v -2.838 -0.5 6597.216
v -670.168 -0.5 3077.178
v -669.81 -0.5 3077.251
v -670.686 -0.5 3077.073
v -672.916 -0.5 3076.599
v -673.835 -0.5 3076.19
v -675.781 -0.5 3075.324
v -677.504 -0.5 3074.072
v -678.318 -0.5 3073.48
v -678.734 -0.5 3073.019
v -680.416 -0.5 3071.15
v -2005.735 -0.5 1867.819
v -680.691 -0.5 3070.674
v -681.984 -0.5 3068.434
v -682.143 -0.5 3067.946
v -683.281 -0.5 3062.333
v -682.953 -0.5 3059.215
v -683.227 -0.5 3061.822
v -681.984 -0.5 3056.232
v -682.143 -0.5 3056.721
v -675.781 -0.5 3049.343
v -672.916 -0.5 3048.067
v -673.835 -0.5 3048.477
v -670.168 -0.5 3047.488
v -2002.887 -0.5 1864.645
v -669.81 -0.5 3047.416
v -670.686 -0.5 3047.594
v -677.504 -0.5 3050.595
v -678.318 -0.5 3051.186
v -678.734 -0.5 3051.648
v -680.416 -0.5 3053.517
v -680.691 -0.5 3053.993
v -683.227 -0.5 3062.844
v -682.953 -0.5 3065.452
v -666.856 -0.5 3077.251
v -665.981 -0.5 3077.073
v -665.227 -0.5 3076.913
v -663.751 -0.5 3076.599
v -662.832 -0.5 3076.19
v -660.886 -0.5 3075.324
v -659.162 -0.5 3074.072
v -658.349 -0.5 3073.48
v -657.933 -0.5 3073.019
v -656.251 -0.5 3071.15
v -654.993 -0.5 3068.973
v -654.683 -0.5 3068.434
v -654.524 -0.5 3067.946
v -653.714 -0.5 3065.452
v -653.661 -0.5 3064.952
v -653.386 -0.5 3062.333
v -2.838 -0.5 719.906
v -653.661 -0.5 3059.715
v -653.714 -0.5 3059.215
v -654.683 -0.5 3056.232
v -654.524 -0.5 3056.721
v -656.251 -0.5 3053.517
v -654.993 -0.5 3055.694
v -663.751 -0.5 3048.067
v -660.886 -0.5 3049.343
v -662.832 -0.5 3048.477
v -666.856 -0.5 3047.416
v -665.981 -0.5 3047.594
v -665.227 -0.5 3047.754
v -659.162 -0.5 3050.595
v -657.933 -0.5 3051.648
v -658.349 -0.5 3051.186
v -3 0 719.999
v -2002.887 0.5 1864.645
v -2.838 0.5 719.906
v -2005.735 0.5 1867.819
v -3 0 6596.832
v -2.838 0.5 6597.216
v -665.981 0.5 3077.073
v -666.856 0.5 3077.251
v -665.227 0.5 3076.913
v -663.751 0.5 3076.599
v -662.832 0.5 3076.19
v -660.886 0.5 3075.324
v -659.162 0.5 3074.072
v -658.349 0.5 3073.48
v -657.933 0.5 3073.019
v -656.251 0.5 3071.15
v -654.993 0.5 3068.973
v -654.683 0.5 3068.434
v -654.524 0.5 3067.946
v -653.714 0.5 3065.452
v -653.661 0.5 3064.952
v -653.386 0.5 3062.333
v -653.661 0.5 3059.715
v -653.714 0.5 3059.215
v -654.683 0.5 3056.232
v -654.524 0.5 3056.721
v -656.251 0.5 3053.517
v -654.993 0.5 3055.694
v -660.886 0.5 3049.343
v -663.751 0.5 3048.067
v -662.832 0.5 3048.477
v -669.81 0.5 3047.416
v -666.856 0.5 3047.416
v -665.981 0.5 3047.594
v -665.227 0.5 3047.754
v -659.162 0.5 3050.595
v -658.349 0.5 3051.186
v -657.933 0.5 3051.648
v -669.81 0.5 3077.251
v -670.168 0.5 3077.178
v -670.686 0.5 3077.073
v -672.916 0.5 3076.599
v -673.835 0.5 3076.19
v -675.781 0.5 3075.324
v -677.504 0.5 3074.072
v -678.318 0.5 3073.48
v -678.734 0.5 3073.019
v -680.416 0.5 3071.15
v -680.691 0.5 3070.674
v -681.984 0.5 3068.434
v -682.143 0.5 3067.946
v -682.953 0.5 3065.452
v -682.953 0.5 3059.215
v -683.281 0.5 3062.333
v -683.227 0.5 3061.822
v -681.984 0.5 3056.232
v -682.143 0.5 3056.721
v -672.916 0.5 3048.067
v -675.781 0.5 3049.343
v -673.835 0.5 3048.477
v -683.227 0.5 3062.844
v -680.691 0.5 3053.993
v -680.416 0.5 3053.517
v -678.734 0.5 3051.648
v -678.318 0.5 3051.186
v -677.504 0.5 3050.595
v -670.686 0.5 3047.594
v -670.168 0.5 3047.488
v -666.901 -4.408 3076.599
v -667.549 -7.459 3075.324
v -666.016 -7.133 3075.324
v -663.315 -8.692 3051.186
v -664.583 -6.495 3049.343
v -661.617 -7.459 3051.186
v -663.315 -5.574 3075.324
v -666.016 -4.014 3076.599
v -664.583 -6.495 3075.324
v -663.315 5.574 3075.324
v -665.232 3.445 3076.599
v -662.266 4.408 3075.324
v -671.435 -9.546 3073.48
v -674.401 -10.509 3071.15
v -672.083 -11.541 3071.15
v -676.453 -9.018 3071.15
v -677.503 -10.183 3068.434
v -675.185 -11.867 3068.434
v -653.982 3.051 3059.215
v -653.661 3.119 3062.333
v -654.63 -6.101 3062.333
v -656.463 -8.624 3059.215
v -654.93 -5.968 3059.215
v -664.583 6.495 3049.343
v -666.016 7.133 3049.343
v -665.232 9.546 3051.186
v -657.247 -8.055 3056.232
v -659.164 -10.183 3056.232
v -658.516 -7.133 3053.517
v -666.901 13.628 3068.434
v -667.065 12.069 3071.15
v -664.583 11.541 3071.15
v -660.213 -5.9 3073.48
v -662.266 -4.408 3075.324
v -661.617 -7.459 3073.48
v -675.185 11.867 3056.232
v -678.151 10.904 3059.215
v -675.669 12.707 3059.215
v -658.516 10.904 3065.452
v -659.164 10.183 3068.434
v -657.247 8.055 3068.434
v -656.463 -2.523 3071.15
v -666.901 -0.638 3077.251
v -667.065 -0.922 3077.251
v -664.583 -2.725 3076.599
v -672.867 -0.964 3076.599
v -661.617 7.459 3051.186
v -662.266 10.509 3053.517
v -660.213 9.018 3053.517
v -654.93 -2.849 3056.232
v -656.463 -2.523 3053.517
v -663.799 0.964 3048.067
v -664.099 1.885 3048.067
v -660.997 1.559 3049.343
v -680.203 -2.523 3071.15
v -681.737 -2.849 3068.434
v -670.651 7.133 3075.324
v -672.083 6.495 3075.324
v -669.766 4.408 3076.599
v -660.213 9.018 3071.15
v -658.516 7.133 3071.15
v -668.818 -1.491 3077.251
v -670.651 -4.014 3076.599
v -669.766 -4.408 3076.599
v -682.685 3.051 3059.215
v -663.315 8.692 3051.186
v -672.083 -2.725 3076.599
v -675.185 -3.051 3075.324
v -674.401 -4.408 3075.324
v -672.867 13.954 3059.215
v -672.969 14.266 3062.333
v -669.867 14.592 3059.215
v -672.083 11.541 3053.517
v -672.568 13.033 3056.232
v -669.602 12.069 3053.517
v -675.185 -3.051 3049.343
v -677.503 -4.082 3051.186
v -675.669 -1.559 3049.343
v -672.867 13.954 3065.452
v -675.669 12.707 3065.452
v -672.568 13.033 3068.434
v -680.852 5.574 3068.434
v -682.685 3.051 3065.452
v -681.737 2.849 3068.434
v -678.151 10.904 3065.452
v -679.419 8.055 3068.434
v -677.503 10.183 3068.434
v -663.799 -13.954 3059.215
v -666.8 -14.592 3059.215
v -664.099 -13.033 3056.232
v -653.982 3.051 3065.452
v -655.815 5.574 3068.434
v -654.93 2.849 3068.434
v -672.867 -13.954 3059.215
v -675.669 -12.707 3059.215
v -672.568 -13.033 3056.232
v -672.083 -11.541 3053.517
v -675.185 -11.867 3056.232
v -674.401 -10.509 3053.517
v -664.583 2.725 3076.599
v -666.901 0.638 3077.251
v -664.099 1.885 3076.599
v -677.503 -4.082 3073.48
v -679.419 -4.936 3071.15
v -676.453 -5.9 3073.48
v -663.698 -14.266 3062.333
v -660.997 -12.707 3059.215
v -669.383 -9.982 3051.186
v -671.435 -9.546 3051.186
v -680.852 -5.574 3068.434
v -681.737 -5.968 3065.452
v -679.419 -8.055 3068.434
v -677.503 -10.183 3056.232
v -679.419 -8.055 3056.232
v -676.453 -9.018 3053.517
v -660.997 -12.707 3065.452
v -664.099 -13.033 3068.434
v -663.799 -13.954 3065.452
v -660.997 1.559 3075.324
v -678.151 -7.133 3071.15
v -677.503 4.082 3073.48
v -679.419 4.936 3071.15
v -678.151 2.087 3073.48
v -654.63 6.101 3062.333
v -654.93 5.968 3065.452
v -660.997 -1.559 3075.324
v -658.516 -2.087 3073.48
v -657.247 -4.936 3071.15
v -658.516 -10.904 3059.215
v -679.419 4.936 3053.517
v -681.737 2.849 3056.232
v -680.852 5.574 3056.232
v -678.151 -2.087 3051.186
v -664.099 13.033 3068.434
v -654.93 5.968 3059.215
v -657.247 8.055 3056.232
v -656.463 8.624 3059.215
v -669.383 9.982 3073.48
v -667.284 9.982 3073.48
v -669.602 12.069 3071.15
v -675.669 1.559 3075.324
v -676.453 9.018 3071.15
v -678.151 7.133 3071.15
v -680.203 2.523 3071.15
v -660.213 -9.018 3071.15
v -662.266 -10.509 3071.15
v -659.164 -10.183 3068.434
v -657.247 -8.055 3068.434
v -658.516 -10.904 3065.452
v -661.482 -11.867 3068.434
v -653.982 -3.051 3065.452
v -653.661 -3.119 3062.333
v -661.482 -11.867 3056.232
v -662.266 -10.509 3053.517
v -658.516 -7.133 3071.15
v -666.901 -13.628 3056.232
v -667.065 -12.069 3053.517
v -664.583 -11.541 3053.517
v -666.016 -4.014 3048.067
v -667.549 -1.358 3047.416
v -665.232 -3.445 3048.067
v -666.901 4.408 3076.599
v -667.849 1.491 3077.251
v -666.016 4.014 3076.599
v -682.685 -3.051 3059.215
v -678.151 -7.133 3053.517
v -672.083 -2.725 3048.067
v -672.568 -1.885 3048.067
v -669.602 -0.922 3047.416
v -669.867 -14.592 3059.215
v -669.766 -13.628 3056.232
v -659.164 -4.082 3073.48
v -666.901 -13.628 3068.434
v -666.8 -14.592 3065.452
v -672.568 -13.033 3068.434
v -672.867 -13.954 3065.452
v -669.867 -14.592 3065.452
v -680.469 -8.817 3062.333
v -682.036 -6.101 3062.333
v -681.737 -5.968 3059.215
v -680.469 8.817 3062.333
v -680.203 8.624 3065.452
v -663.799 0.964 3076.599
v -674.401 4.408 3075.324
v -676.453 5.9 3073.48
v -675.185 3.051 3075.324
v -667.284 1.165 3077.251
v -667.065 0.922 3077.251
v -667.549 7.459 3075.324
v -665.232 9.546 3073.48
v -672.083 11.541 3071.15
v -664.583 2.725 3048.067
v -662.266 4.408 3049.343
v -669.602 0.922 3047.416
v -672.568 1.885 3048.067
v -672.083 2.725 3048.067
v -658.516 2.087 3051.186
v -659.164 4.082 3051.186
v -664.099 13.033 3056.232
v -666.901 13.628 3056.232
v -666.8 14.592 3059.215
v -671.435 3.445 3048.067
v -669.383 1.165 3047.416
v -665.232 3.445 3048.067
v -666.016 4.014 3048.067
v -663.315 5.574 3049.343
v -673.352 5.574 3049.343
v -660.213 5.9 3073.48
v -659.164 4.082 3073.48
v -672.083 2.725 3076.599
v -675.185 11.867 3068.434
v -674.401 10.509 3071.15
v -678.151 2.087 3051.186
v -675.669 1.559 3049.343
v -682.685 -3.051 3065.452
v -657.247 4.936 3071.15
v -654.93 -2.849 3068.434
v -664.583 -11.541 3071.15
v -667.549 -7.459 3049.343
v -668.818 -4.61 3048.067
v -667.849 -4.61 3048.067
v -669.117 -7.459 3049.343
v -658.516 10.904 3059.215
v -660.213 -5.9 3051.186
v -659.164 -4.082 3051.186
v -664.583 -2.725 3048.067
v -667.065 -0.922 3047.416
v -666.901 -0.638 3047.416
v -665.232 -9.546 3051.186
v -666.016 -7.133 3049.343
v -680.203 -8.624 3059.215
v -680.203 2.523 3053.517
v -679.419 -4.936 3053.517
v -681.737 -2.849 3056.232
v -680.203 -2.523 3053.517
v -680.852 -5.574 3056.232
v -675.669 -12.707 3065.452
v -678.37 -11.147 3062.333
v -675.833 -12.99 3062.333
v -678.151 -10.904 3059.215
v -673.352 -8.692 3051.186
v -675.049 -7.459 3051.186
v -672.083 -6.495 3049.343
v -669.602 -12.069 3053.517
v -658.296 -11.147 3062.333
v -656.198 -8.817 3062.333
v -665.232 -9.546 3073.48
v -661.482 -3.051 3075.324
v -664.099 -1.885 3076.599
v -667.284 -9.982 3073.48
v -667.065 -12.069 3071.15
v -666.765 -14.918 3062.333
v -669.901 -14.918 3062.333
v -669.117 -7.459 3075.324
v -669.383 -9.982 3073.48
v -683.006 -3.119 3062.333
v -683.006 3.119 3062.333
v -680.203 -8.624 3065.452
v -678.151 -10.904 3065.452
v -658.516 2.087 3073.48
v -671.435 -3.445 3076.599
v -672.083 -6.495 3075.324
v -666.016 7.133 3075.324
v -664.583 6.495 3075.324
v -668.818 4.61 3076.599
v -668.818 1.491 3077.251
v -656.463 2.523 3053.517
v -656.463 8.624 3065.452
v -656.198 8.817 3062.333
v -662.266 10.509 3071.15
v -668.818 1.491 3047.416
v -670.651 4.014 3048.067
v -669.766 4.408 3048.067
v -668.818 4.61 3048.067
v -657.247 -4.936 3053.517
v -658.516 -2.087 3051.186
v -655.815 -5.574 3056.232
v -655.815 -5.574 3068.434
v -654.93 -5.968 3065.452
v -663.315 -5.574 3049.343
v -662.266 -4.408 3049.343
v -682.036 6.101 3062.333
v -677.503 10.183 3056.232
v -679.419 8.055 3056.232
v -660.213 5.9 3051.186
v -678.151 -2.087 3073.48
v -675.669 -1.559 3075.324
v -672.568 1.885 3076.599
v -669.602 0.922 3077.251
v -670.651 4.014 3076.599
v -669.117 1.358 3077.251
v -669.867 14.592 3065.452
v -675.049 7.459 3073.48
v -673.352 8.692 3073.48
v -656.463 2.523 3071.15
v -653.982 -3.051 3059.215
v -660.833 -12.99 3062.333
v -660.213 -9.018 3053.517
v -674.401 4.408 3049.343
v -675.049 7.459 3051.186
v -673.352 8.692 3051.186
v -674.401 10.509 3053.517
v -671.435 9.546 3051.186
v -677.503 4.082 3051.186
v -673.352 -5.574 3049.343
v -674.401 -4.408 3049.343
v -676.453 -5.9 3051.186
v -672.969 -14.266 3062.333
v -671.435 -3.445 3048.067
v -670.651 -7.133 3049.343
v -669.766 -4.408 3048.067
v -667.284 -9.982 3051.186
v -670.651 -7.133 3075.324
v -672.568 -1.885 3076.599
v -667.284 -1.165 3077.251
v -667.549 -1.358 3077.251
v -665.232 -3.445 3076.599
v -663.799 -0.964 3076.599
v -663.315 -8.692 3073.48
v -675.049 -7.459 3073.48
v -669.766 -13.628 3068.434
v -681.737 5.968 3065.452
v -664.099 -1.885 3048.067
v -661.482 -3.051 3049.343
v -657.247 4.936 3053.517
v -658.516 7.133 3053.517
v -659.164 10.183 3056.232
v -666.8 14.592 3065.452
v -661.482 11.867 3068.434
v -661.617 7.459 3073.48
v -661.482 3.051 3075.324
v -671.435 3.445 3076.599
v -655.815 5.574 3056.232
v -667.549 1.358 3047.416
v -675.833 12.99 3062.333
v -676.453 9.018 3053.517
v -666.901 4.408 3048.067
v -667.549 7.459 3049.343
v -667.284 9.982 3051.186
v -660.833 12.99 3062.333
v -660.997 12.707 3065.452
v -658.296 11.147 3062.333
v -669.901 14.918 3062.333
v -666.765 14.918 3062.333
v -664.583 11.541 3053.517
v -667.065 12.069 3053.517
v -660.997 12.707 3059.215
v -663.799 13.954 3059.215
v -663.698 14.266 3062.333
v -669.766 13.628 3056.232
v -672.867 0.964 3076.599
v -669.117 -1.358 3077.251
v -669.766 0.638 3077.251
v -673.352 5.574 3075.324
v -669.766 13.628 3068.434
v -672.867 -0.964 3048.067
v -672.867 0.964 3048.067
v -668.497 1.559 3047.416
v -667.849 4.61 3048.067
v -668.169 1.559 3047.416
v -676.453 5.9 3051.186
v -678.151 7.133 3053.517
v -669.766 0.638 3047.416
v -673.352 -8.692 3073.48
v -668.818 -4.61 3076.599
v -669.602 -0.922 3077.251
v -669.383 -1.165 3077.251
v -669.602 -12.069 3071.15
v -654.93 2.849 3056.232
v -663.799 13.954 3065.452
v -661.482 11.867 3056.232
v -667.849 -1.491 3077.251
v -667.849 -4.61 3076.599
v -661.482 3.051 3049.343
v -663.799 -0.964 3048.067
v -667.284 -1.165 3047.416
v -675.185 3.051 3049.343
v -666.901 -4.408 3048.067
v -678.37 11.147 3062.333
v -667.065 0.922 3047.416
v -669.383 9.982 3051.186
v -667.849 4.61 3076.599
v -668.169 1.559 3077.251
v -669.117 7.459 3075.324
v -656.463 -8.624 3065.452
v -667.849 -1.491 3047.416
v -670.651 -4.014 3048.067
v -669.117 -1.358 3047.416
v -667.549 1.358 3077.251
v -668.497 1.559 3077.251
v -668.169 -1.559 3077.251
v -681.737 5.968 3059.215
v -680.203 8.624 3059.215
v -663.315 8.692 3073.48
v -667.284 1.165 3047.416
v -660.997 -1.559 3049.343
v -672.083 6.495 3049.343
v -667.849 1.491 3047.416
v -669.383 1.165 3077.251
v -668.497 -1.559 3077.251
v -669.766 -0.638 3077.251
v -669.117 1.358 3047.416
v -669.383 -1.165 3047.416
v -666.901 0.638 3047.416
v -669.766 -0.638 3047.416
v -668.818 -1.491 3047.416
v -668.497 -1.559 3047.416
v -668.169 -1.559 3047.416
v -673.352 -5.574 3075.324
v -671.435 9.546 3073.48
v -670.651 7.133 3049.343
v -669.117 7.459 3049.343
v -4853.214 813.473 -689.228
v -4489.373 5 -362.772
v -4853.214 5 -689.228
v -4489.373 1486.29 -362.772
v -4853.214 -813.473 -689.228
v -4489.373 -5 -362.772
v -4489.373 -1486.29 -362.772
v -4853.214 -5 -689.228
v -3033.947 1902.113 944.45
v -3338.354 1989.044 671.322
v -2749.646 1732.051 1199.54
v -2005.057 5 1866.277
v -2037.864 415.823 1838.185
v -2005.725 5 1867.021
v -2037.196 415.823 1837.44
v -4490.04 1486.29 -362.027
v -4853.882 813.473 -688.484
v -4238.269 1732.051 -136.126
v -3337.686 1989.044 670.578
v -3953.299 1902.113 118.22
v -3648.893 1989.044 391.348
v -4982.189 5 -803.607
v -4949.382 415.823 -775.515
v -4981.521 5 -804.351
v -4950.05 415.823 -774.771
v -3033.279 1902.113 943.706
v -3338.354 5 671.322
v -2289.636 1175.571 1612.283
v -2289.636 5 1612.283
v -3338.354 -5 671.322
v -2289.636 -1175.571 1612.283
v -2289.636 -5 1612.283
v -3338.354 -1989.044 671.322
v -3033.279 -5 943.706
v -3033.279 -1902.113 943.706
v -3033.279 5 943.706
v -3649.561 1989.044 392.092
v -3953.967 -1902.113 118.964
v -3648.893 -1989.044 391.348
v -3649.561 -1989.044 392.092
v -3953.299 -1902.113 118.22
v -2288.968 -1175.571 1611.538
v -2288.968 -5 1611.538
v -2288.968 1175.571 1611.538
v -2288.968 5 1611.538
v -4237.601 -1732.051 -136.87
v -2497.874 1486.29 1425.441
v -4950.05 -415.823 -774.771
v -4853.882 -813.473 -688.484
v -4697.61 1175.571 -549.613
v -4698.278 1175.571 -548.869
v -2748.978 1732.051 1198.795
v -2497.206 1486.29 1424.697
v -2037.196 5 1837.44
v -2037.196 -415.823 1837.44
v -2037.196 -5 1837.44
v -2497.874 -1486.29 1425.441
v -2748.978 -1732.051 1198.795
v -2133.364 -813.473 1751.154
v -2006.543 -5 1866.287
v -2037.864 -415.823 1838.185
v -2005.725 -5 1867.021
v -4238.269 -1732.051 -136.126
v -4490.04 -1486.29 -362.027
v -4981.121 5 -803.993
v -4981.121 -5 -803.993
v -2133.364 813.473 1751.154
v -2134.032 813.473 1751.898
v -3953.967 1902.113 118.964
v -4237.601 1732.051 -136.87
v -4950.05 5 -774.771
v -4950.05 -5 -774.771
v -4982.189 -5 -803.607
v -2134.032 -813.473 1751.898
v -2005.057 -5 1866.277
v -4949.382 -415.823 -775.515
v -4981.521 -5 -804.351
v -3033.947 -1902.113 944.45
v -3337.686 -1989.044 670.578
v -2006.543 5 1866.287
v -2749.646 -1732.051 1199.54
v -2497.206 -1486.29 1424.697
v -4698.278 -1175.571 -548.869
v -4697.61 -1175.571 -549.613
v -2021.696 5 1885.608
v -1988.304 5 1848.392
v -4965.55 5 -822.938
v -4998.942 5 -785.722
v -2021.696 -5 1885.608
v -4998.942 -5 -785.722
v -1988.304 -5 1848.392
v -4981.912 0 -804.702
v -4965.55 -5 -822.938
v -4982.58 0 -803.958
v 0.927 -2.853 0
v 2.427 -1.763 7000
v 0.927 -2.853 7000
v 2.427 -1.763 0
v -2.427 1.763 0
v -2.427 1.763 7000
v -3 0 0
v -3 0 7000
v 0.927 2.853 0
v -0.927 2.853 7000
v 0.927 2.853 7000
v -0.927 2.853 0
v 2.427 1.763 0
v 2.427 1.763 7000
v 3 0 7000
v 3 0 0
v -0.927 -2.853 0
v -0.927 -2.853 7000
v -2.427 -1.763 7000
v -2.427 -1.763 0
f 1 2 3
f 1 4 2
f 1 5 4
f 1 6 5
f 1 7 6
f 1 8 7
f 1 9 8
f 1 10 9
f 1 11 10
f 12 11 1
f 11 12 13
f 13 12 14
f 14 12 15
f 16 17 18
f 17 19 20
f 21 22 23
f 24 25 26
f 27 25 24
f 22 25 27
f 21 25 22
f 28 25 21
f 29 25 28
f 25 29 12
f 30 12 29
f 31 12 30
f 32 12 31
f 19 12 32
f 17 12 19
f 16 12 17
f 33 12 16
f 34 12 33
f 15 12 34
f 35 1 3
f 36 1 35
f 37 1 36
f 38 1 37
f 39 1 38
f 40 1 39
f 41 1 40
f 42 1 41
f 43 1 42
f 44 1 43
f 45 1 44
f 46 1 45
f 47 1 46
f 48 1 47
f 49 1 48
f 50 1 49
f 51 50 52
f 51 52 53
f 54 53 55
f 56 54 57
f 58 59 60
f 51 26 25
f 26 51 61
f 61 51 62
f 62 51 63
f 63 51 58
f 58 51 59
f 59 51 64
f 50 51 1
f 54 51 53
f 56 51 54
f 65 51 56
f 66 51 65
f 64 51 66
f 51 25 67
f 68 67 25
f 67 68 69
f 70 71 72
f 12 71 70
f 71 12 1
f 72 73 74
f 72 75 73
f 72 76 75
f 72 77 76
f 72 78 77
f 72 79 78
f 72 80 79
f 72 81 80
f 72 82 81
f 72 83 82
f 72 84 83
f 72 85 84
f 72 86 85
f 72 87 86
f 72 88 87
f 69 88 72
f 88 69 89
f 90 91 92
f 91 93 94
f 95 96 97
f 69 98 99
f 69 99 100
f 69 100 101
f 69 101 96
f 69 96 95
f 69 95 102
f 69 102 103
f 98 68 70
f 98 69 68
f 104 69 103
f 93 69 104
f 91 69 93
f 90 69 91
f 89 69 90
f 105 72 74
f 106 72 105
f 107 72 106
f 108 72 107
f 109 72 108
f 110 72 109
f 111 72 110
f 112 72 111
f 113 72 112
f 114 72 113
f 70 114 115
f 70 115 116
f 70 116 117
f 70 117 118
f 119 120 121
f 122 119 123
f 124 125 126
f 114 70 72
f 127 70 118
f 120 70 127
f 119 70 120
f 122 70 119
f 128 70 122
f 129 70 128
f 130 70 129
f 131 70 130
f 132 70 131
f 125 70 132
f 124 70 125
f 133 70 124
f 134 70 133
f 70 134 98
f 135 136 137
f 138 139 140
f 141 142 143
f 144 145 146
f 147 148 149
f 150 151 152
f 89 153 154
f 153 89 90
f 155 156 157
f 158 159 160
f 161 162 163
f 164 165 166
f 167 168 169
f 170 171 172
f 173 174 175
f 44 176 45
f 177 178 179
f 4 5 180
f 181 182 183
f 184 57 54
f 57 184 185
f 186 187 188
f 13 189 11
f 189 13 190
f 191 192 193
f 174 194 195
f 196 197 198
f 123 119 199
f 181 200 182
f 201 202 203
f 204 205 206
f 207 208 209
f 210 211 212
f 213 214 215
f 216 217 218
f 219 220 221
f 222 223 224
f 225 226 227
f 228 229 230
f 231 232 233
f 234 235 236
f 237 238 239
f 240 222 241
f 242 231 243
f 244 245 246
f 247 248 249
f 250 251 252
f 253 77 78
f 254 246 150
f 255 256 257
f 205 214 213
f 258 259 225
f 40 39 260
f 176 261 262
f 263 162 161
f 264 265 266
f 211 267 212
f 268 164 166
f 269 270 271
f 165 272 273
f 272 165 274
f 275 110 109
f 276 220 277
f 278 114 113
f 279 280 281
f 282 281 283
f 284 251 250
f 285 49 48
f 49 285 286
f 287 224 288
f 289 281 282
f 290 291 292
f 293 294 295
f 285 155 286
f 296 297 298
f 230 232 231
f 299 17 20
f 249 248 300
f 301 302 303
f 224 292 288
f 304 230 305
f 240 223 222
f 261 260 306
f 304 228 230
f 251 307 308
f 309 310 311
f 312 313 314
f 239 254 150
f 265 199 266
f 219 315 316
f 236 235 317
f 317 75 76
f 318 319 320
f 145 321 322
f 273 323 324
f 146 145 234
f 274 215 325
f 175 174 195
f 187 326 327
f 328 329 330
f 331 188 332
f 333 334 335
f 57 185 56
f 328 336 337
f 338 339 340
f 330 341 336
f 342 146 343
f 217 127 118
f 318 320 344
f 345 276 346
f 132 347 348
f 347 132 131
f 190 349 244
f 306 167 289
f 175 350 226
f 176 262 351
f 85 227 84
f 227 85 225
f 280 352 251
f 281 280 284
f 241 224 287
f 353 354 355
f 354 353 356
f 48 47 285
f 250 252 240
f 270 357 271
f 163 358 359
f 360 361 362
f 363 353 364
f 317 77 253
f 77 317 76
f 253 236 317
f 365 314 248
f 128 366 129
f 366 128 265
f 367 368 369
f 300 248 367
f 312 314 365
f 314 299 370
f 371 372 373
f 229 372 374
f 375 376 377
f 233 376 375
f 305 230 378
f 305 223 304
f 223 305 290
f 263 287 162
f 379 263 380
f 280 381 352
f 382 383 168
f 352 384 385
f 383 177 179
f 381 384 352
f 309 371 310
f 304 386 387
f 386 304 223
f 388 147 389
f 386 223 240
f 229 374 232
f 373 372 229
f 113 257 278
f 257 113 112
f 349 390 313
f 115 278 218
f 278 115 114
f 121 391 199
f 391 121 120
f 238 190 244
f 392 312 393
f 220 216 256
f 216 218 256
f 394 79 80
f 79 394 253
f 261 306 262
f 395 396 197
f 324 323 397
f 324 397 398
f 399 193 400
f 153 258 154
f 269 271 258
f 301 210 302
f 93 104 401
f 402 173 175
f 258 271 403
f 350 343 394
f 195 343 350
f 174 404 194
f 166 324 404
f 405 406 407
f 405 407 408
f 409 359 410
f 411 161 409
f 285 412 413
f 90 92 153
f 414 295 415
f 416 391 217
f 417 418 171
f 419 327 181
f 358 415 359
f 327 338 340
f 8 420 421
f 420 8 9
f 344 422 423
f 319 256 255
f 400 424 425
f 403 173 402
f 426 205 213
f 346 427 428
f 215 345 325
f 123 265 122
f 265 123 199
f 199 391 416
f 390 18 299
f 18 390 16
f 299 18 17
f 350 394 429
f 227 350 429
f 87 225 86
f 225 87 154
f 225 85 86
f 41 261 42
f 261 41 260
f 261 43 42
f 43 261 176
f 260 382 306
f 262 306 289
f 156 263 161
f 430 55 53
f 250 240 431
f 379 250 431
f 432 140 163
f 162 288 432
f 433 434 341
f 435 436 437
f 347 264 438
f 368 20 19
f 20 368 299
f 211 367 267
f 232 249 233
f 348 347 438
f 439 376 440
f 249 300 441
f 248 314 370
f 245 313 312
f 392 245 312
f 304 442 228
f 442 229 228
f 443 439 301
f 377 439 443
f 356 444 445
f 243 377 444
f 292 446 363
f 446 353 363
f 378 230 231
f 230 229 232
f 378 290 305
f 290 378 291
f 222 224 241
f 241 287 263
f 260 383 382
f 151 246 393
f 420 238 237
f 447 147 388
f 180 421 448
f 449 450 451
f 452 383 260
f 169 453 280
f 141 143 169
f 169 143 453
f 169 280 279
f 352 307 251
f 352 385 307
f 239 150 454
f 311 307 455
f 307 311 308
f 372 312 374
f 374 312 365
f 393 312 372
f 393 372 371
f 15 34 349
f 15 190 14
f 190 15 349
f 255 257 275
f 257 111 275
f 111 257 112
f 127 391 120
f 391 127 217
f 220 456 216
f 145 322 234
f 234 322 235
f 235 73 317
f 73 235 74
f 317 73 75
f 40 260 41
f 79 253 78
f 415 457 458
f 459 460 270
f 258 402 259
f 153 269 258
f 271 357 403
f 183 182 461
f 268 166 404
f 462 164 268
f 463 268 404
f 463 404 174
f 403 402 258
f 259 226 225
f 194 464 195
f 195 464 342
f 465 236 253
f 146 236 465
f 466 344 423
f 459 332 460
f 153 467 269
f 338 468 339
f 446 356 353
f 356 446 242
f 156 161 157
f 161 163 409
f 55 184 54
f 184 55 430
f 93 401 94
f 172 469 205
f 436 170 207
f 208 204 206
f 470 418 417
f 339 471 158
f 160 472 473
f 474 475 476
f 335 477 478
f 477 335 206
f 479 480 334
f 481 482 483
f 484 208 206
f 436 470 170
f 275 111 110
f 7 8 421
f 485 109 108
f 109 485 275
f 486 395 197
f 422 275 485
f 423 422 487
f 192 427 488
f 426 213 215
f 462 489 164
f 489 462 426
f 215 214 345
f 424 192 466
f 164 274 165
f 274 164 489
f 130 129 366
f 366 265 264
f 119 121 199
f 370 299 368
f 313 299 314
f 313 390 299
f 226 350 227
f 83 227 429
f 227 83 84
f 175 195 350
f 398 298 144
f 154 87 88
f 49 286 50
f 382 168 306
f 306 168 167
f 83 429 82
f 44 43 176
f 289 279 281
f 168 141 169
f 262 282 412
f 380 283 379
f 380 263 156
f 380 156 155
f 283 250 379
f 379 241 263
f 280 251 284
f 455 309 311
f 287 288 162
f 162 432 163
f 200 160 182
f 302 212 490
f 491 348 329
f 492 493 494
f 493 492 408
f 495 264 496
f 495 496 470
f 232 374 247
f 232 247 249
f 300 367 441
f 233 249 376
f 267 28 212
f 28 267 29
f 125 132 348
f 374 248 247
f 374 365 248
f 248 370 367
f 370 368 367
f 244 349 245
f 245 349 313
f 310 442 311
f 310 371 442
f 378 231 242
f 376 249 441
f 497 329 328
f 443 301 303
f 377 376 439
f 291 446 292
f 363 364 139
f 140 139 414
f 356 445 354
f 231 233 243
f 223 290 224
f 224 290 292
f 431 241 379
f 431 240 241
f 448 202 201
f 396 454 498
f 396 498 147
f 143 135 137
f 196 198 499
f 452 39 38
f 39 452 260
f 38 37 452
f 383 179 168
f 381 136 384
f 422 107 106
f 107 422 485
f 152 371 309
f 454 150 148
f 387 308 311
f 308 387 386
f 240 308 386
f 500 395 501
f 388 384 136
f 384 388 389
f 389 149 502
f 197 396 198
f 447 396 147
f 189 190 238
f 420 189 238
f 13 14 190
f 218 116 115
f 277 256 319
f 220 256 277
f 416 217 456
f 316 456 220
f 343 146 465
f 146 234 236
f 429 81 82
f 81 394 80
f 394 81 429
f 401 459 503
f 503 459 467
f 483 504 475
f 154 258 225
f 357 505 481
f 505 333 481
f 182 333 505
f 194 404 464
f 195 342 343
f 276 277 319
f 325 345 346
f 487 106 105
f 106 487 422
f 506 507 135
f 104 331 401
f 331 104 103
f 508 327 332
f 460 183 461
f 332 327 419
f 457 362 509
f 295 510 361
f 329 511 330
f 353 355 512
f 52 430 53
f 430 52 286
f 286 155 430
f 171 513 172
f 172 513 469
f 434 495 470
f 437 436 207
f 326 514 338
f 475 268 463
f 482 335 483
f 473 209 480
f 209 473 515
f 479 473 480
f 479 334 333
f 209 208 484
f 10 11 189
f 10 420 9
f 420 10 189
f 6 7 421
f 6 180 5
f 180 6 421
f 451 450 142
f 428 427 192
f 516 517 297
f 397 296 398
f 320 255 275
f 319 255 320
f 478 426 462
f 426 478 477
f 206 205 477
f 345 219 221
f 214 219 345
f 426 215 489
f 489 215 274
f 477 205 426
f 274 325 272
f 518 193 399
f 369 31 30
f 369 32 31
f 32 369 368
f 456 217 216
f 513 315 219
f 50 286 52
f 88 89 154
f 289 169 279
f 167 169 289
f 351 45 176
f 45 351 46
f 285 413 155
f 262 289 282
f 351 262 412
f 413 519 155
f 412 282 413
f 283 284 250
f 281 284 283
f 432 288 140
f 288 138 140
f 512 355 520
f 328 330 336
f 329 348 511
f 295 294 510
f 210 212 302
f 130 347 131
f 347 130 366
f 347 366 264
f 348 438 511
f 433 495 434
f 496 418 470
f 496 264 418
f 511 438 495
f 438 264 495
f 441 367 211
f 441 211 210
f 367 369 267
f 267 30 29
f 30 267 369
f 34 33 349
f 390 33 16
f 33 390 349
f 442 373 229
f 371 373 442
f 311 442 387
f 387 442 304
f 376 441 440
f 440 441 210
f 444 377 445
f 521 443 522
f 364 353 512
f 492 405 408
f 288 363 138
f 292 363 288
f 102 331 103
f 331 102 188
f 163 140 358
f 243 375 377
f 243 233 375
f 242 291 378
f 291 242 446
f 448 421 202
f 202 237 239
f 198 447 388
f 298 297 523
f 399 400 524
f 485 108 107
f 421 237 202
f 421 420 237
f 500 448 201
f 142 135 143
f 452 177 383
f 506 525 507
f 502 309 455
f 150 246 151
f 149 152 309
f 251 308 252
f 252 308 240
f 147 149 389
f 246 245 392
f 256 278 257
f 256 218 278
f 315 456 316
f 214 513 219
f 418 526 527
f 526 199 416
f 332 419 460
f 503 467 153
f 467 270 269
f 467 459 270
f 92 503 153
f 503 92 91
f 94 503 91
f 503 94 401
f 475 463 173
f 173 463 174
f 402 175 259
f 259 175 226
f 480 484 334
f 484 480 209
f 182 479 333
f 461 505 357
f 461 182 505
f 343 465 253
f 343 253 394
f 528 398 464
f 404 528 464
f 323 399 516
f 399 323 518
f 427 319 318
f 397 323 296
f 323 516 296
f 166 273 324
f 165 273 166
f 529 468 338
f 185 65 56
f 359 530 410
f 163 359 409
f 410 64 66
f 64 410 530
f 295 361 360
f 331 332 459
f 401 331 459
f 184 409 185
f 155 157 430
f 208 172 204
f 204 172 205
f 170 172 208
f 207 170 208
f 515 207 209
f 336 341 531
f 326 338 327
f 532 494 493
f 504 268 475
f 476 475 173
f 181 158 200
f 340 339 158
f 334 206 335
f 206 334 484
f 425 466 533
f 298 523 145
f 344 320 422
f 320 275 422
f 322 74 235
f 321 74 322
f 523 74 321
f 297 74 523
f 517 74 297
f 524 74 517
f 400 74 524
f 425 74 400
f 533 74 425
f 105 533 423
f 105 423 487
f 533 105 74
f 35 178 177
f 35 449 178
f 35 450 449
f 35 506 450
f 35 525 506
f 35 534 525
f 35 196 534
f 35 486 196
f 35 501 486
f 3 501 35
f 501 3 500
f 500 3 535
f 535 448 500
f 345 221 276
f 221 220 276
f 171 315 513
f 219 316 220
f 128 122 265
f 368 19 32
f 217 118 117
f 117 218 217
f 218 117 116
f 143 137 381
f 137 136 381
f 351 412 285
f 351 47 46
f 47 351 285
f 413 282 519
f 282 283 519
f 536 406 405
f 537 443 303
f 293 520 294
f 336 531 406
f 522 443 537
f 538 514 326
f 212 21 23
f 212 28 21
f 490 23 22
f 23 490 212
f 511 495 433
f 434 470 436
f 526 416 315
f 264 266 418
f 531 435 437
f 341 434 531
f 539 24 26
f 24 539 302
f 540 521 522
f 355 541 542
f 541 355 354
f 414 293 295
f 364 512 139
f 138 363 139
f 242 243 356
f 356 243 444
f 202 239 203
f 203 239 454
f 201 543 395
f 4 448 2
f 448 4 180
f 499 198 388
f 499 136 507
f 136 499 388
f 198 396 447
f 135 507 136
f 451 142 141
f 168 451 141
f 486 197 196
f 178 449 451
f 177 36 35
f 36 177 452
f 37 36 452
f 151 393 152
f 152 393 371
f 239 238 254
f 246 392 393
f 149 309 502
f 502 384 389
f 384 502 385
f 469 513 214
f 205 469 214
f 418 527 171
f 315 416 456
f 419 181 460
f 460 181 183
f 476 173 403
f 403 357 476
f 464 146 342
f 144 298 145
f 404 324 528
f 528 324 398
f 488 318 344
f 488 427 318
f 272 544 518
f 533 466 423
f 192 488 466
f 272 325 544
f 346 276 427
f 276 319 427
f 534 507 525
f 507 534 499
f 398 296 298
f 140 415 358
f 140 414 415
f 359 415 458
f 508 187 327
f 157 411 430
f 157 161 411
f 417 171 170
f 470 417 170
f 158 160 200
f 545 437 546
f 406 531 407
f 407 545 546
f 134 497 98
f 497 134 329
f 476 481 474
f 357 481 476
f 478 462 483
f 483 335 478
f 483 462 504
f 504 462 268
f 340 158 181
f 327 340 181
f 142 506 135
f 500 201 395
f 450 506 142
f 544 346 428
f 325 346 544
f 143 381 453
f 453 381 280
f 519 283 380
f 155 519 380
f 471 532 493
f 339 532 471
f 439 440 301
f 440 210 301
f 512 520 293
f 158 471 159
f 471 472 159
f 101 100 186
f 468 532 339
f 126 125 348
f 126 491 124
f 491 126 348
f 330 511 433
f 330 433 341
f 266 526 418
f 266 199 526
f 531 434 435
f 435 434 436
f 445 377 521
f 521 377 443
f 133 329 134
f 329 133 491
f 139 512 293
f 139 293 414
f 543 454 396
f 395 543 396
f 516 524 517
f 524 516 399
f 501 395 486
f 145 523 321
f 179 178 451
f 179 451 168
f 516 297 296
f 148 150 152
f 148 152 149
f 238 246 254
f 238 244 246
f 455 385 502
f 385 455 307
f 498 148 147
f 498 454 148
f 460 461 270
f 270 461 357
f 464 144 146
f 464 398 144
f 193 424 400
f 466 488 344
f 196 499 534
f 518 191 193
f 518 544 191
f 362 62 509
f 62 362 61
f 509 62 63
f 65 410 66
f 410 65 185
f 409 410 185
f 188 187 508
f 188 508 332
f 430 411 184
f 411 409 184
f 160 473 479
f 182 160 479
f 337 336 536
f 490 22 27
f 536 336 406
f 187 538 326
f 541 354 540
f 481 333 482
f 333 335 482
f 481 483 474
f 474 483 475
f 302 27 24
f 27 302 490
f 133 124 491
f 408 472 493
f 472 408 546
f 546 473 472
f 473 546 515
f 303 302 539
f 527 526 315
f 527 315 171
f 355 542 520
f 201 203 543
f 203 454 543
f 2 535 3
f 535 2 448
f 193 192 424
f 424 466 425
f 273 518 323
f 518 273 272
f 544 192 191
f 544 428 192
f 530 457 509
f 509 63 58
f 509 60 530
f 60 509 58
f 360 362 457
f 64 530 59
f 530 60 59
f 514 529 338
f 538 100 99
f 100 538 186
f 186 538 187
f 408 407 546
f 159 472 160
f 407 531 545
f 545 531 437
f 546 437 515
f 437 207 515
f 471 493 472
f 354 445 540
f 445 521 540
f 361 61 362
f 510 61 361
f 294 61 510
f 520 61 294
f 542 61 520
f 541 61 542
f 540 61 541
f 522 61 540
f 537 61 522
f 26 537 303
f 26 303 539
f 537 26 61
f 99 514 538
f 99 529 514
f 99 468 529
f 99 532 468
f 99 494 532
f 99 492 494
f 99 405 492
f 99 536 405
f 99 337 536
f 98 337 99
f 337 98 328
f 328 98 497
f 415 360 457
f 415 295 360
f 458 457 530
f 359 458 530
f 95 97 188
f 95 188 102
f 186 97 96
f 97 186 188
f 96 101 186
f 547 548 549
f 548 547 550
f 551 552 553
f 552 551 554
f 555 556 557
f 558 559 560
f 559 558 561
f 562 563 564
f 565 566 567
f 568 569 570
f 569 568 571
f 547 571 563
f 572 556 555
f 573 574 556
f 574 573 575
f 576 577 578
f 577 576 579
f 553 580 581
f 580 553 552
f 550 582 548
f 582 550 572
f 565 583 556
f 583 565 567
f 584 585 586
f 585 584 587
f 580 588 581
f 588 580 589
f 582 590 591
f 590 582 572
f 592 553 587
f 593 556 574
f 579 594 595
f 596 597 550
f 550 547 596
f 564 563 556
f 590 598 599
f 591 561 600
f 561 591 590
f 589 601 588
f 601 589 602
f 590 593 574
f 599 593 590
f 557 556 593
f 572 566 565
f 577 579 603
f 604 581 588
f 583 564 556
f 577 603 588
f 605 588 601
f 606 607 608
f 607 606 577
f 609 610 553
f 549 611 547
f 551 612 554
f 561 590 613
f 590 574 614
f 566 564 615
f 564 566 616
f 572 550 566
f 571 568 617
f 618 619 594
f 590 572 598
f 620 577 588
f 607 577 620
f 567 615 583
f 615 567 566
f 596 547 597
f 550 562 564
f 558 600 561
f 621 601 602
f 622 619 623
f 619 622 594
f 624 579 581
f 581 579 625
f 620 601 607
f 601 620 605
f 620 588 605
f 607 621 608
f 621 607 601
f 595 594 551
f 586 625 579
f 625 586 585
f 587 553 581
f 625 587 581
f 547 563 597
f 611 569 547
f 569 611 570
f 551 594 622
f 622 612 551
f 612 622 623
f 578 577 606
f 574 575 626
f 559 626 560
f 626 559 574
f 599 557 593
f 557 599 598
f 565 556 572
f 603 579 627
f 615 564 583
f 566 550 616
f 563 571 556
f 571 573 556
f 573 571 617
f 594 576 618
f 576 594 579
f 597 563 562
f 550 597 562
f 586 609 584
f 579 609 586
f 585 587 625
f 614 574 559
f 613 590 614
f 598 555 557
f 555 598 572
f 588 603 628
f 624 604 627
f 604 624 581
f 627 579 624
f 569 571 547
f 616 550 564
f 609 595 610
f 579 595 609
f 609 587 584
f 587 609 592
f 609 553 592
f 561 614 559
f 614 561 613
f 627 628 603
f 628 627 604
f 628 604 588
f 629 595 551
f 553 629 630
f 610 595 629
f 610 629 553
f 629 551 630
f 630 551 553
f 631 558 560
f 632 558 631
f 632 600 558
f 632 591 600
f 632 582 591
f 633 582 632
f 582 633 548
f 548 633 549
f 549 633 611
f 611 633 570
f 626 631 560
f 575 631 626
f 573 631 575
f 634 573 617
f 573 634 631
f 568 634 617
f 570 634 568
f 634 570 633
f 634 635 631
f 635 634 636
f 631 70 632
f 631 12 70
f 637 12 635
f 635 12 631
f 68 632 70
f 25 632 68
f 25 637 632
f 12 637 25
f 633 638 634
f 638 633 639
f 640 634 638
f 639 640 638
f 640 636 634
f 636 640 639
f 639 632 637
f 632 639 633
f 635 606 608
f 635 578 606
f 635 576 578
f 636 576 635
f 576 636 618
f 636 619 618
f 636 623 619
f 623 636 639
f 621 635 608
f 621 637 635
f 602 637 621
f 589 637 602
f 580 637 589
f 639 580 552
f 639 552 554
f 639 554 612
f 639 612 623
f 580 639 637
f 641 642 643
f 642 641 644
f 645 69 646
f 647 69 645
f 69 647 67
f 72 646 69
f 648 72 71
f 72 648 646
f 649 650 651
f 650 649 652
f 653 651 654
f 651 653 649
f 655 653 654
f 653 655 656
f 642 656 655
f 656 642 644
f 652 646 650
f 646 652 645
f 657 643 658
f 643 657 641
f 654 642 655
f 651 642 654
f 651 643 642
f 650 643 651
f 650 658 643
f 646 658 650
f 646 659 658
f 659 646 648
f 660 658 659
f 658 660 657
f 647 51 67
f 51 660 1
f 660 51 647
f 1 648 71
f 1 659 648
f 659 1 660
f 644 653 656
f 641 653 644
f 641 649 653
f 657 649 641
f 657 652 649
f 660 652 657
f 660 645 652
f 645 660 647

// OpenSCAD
// file: el_gen_shtag.scad
diamGenShtag = 6;

//translate([-2000,0,0]) 
GenShtag(7570);

module GenShtag(shtagLen) {
   translate([shtagLen/2, 0, 0]) rotate([0,90,0]) cylinder(h=shtagLen, d=diamGenShtag, center=true);       
}
// main file
use <el_gen_shtag.scad>;


//Staksel();
AlyanaKliver(7000, 400);

module AlyanaKliver(alShtagLen, alShtagOffset){

  r1 = 1;
  wid = 1;



  frontShkatLen = 5880;
  shkotAngleXOffset = 2005;
  shkotAngleZOffset = 4733;

  xMed = (0+0-shkotAngleXOffset)/3;
  zMed = (0-shkotAngleZOffset-frontShkatLen)/3;


  shkotAngleWorkRad = 2000;
  shkotAngleWorkYRotation = -41.9;



  translate([ 0 , 0 , alShtagLen ]) {
      
      rotate([ 0 , +90 , 0 ])
      GenShtag(alShtagLen);


      translate([ 0 , 0 , -alShtagOffset ]) {
        rotate([ 0 , -90 , 0 ])
        hull()  { 
  
          translate([ - 1 , 0 , 1 ]) 
          rotate([ 90 , 0 , 0 ])
          cylinder( r = r1 , h = wid , center = true );
  
          translate([  - frontShkatLen , 0 , 1 ]) 
          rotate([ 90 , 0 , 0 ])
          cylinder( r = r1 , h = wid , center = true );
  
          translate([- shkotAngleZOffset , 0 ,shkotAngleXOffset ]) 
          rotate([ 90 , 0 , 0 ])
          cylinder( r = r1 , h = wid , center = true );
  
        }

        translate([ xMed , 0 , zMed ])
        sphere(d = 30);


        translate([ -shkotAngleXOffset , 0 , -shkotAngleZOffset ])
        rotate([ 0 , shkotAngleWorkYRotation , 0 ])
        translate([ -shkotAngleWorkRad , 0 , 0 ])
        cylinder( r = shkotAngleWorkRad , h = 1 , center=true );
  
  
      
        translate([ -shkotAngleXOffset , 0 , -shkotAngleZOffset ])
        rotate([ 0 , shkotAngleWorkYRotation , 0 ])
        translate([ -shkotAngleWorkRad , 0 , 0 ])
        cube([ 2*shkotAngleWorkRad , 10 , 50 ] , center=true );


      } 

  }
  
}
